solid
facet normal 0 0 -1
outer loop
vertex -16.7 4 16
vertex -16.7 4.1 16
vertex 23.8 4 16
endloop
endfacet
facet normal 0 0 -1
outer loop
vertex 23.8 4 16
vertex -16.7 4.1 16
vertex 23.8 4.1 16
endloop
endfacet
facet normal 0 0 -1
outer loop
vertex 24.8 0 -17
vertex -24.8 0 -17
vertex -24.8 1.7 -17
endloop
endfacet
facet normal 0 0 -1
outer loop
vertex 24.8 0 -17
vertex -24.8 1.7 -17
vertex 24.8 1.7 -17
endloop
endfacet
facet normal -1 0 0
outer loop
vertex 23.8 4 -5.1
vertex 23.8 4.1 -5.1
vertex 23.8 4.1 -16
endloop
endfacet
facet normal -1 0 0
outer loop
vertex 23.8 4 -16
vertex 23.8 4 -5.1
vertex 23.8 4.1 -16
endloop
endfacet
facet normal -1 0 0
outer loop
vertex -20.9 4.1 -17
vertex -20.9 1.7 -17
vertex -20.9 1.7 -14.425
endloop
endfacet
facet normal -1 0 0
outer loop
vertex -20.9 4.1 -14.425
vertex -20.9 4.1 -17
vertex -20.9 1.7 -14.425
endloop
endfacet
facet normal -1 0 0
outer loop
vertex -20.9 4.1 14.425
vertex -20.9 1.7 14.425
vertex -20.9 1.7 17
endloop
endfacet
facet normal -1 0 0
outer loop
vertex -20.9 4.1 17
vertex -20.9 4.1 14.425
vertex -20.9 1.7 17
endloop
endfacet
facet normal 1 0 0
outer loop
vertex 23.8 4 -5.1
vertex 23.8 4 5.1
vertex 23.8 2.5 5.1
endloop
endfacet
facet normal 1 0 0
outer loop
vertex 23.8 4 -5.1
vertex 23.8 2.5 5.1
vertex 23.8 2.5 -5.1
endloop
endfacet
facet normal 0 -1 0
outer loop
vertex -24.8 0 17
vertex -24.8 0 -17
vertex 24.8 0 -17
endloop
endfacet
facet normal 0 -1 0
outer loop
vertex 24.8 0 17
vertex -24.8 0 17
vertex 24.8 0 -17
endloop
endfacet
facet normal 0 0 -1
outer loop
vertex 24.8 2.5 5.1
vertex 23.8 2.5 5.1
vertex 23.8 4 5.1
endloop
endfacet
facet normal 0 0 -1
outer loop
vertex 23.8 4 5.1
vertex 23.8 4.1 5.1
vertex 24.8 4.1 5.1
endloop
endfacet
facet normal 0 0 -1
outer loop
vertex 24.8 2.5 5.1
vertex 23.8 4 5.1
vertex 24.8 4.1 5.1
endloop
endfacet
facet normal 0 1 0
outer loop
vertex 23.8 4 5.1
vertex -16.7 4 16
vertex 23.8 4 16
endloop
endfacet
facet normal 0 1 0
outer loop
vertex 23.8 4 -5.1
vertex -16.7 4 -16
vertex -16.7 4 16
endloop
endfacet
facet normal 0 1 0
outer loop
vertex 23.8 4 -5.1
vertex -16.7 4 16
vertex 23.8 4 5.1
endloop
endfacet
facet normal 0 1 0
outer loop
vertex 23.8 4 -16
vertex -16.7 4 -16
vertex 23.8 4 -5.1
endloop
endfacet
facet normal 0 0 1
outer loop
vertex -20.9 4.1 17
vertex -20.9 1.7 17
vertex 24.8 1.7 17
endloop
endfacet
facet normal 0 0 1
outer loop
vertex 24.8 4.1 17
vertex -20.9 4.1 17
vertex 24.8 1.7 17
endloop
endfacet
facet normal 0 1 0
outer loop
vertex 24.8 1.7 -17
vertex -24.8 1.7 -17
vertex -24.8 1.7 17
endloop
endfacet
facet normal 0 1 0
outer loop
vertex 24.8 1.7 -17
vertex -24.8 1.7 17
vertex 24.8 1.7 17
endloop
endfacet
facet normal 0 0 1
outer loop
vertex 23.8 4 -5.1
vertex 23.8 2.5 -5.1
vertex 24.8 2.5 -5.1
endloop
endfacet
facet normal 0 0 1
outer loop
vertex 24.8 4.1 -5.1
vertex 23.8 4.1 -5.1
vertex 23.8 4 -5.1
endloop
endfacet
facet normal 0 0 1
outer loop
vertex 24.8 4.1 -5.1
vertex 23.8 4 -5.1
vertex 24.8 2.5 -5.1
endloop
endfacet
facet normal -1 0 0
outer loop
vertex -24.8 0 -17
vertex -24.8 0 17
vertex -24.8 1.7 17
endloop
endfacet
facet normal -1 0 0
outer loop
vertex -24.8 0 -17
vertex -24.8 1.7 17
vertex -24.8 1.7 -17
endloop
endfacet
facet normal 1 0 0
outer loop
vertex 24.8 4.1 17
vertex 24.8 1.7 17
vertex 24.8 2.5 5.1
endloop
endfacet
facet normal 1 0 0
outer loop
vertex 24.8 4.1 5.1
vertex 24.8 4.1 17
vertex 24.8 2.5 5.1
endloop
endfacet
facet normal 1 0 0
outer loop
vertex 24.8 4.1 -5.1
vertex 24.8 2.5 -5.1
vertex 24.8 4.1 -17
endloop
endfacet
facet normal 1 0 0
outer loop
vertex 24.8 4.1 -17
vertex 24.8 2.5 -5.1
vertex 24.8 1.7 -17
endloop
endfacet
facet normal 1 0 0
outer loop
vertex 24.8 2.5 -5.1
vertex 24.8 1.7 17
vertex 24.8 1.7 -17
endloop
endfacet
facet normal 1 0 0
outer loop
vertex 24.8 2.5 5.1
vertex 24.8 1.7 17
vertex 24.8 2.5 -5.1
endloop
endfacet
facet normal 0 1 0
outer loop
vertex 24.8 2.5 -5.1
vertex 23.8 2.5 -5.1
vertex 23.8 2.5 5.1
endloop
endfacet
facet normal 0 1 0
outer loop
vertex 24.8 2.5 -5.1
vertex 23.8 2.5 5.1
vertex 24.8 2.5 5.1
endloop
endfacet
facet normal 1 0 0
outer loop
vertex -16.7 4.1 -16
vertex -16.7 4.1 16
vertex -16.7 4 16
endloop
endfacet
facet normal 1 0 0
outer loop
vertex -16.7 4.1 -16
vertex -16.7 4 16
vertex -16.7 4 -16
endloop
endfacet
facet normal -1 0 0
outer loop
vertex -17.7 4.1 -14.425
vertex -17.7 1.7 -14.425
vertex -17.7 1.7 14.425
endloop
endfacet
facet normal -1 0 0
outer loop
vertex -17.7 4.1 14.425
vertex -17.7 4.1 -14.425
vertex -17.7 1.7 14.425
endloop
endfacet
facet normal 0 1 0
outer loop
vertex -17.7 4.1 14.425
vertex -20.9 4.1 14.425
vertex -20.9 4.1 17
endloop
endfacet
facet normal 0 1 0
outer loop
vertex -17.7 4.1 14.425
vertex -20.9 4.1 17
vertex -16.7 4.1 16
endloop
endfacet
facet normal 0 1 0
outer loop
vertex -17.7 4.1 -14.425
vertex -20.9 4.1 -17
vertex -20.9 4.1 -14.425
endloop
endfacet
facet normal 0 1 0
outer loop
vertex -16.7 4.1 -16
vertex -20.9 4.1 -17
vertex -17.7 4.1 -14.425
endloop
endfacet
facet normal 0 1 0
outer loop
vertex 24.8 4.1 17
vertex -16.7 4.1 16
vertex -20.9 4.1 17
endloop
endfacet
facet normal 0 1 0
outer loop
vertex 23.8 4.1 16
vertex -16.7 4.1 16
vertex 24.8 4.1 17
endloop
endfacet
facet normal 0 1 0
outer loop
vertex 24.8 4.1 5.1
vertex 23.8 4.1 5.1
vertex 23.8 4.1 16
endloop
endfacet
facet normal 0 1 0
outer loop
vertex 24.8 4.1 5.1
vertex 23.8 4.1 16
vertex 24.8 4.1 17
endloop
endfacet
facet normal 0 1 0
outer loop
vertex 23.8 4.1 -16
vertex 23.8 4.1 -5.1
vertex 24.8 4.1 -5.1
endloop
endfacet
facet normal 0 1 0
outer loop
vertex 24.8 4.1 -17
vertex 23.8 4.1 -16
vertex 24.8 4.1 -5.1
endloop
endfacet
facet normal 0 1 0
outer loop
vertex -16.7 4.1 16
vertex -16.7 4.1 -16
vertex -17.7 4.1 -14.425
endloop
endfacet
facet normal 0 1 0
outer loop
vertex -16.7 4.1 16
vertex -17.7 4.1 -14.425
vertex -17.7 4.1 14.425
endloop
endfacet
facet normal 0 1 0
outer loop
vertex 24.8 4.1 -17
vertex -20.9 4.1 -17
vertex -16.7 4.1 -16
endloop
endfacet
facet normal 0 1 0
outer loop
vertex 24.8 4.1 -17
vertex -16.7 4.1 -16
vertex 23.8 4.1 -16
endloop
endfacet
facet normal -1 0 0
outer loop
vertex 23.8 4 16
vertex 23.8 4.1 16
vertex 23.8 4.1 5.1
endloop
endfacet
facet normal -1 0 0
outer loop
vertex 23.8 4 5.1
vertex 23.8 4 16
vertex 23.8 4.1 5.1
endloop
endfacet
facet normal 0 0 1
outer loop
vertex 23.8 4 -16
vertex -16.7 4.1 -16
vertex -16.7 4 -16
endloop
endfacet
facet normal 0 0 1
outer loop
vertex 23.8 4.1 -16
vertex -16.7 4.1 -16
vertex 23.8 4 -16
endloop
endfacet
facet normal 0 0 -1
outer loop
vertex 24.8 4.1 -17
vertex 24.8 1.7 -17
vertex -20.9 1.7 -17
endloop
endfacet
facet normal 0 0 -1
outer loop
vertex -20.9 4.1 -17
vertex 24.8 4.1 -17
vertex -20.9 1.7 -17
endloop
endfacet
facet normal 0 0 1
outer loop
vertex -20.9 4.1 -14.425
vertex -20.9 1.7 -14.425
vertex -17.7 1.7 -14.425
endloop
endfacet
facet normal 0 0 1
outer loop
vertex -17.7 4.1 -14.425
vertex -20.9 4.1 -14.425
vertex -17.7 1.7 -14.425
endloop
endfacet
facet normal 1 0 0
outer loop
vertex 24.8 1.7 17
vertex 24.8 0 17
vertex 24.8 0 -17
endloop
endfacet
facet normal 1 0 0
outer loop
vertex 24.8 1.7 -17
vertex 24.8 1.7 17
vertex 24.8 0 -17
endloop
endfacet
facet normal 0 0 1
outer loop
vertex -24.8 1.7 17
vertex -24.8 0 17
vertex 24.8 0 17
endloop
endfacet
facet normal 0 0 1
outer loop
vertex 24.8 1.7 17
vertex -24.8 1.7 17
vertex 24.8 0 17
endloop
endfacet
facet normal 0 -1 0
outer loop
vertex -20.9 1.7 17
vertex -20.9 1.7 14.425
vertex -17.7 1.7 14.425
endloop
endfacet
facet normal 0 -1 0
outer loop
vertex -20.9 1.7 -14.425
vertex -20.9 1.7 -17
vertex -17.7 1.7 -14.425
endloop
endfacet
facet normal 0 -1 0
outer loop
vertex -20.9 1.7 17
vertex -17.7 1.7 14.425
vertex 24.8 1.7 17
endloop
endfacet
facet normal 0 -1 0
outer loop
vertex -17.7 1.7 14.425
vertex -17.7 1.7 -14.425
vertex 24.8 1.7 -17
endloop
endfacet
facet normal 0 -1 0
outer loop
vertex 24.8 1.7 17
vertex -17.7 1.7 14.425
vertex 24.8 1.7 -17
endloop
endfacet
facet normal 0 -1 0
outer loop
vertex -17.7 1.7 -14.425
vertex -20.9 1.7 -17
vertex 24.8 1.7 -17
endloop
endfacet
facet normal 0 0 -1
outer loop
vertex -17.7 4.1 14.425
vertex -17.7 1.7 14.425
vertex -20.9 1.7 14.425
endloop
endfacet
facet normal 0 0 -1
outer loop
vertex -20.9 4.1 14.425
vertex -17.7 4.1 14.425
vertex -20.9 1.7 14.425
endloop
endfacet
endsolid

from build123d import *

# Parameters (mm, degrees)
SKETCH1_W           = 49.6
SKETCH1_H           = 34
BOSS_EXTRUDE1_DEPTH = 1.7
BOSS_EXTRUDE2_DEPTH = 2.4
SKETCH4_W           = 40.5
SKETCH4_H           = 32
CUT_EXTRUDE1_DEPTH  = 0.1
SKETCH5_W           = 1
SKETCH5_H           = 10.2
CUT_EXTRUDE2_DEPTH  = 1.6


with BuildPart() as part:
    # Sketch1 → Boss-Extrude1 (new body)
    with BuildSketch(Plane(origin=(0, 0, 0), x_dir=(1, 0, 0), z_dir=(0, 1, 0))):
        Rectangle(SKETCH1_W, SKETCH1_H)
    extrude(amount=BOSS_EXTRUDE1_DEPTH)


with BuildPart() as body_2:
    # Sketch3 → Boss-Extrude2 (new body)
    with BuildSketch(Plane(origin=(0, 1.7, 0), x_dir=(1, 0, 0), z_dir=(0, 1, 0))):
        Polygon((24.8, -17), (24.8, 17), (-20.9, 17), (-20.9, 14.425), (-17.7, 14.425), (-17.7, -14.425), (-20.9, -14.425), (-20.9, -17), align=None)
    extrude(amount=BOSS_EXTRUDE2_DEPTH)

    # Sketch4 → Cut-Extrude1 (cut)
    with BuildSketch(Plane(origin=(0, 4.1, 0), x_dir=(1, 0, 0), z_dir=(0, 1, 0))):
        with Locations((3.55, 0)):
            Rectangle(SKETCH4_W, SKETCH4_H)
    extrude(amount=-CUT_EXTRUDE1_DEPTH, mode=Mode.SUBTRACT)

    # Sketch5 → Cut-Extrude2 (cut)
    with BuildSketch(Plane(origin=(0, 4.1, 0), x_dir=(1, 0, 0), z_dir=(0, 1, 0))):
        with Locations((24.3, 0)):
            Rectangle(SKETCH5_W, SKETCH5_H)
    extrude(amount=-CUT_EXTRUDE2_DEPTH, mode=Mode.SUBTRACT)


solid = Compound([part.part, body_2.part])
